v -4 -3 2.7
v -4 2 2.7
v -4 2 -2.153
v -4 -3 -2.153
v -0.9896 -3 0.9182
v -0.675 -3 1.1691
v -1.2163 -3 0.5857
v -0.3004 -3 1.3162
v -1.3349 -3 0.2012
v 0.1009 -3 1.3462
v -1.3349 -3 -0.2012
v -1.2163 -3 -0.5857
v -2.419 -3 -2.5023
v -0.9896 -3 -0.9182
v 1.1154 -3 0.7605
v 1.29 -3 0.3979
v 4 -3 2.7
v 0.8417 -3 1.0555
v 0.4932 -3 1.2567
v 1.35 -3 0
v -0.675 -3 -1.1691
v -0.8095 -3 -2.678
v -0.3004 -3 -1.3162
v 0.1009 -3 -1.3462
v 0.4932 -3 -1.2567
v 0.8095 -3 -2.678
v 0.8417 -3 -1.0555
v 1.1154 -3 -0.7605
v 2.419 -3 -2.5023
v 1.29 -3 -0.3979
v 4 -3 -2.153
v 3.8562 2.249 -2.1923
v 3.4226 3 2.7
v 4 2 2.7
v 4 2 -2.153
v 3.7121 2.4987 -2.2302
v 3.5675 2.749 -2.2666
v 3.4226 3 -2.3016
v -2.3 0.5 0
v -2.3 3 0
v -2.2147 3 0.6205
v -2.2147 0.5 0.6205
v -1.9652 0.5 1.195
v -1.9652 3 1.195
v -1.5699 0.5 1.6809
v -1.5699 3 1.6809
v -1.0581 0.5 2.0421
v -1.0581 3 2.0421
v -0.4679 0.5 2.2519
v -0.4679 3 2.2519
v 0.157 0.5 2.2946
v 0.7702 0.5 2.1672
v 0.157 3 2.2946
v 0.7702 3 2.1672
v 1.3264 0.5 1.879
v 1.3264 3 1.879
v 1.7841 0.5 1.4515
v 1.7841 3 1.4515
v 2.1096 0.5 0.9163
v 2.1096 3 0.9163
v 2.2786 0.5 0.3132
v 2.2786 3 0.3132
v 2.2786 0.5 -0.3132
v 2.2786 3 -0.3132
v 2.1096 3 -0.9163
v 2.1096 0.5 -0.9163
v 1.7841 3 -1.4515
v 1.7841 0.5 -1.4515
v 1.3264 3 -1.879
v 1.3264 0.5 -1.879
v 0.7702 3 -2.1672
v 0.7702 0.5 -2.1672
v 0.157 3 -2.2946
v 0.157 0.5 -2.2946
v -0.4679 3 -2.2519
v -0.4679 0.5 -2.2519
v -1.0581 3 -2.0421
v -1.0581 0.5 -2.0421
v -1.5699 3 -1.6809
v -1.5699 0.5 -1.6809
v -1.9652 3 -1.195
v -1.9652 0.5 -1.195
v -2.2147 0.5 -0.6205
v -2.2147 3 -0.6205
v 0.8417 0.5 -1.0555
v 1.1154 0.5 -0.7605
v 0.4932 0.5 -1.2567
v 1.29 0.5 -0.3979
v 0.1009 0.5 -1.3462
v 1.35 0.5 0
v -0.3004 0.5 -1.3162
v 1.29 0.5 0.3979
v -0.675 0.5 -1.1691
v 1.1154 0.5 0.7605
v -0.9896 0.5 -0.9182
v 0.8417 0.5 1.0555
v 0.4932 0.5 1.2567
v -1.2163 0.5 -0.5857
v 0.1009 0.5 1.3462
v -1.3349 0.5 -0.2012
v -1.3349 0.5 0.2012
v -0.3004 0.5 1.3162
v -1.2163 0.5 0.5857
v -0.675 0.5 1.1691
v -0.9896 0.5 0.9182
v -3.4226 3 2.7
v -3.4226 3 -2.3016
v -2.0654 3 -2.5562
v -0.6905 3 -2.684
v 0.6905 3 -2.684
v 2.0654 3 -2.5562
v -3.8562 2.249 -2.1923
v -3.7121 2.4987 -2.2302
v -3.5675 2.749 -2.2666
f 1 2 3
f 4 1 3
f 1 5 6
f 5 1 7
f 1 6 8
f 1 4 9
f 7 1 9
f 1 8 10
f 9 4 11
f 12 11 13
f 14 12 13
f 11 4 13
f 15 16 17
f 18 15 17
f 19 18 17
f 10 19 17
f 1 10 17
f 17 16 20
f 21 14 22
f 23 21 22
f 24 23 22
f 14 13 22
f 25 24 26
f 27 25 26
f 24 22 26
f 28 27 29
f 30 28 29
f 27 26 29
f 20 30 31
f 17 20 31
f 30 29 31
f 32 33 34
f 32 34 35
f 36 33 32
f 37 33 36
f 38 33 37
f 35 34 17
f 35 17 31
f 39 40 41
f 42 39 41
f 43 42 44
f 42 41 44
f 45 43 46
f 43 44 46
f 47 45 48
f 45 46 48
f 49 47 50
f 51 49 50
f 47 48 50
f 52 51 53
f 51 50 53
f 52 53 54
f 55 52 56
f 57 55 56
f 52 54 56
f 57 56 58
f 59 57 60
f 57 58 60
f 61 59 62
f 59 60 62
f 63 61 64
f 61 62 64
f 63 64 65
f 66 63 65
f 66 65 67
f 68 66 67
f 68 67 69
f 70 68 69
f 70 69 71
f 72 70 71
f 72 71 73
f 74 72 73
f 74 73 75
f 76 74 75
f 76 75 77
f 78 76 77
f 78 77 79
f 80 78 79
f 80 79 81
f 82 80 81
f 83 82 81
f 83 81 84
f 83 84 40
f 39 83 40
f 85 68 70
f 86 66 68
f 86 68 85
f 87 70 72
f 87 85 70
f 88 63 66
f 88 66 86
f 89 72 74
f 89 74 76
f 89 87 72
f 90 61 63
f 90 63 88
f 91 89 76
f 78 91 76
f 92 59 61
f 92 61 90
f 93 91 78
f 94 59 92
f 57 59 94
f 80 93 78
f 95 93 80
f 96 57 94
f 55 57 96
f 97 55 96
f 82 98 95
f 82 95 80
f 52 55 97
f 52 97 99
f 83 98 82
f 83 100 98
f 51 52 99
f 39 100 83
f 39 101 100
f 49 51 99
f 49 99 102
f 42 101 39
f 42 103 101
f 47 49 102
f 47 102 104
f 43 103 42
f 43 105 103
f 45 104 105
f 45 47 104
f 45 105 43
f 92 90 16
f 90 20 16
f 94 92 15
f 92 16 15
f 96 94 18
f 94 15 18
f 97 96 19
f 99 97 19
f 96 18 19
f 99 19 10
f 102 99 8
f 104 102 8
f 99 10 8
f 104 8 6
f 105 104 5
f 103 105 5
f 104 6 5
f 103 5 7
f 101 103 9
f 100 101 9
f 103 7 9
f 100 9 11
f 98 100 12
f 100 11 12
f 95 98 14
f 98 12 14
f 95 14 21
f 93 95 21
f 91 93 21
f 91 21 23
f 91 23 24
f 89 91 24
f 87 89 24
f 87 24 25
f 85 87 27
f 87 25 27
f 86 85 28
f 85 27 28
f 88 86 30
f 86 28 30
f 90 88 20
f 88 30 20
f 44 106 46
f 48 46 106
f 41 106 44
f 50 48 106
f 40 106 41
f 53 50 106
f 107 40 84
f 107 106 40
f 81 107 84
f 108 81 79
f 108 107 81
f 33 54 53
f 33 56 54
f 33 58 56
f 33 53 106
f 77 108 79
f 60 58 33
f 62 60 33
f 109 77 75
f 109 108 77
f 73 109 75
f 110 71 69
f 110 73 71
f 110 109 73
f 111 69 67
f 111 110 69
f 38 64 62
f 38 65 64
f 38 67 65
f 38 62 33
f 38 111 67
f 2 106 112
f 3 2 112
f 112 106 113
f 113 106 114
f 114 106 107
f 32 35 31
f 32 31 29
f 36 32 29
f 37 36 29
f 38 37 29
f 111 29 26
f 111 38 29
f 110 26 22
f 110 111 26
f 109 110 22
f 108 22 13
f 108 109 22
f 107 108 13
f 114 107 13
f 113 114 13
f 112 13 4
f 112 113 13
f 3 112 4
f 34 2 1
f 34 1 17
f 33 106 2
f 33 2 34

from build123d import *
from OCP.BRepFilletAPI import BRepFilletAPI_MakeChamfer

# Parameters (mm, degrees)
SKETCH1_W                = 8
SKETCH1_H                = 5.7
EXTRUDED_BOSS_BASE_DEPTH = 3
LEGACY_HOLE_D            = 2.7
LEGACY_HOLE_CBORE_D      = 4.6
LEGACY_HOLE_CBORE_DEPTH  = 2.5
FILLET_2_SIZE            = 1
FILLET_2_SIZE2           = 0.577350269
SKETCH4_R                = 15.717506164
SKETCH4_R_2              = 14.9
EXTRUDED_CUT_DEPTH       = 8.810249676


with BuildPart() as part:
    # Sketch1 → Extruded Boss/Base (new, symmetric)
    with BuildSketch(Plane(origin=(0, 0, 0), x_dir=(1, 0, 0), z_dir=(0, 1, 0))):
        with Locations((0, 0.15)):
            Rectangle(SKETCH1_W, SKETCH1_H)
    extrude(amount=EXTRUDED_BOSS_BASE_DEPTH, both=True)

    # Legacy Hole (through all)
    with Locations(Plane(origin=(0, 3, 0), x_dir=(-1, 0, 0), z_dir=(0, 1, 0))):
        with Locations((0, 0)):
            CounterBoreHole(LEGACY_HOLE_D / 2, LEGACY_HOLE_CBORE_D / 2, LEGACY_HOLE_CBORE_DEPTH)

    # Fillet 2: one chamfer whose edges measure the first distance from different faces: ONE call of the kernel's chamfer builder (chamfer() names one face for all edges)
    fillet_2_edges_1 = [part.edges().sort_by_distance(p)[0] for p in [
        (4, 3, -0.15),
    ]]
    fillet_2_side_1 = [part.faces().sort_by_distance(p)[0] for p in [
        (4, 0, -0.15),
    ]]
    fillet_2_edges_2 = [part.edges().sort_by_distance(p)[0] for p in [
        (-4, 3, -0.15),
    ]]
    fillet_2_side_2 = [part.faces().sort_by_distance(p)[0] for p in [
        (-4, 0, -0.15),
    ]]
    fillet_2 = BRepFilletAPI_MakeChamfer(part.part.solid().wrapped)
    for e in fillet_2_edges_1:
        fillet_2.Add(FILLET_2_SIZE, FILLET_2_SIZE2, e.wrapped, fillet_2_side_1[0].wrapped)  # the first distance lies on this face
    for e in fillet_2_edges_2:
        fillet_2.Add(FILLET_2_SIZE, FILLET_2_SIZE2, e.wrapped, fillet_2_side_2[0].wrapped)  # the first distance lies on this face
    add(Compound.cast(fillet_2.Shape()), mode=Mode.REPLACE)

    # Sketch4 → Extruded Cut (cut, through all)
    with BuildSketch(Plane(origin=(0, 3, 0), x_dir=(1, 0, 0), z_dir=(0, 1, 0))):
        with Locations((0, -12.2)):
            Circle(SKETCH4_R)
        with Locations((0, -12.2)):
            Circle(SKETCH4_R_2, mode=Mode.SUBTRACT)
    extrude(amount=-EXTRUDED_CUT_DEPTH, mode=Mode.SUBTRACT)


solid = part.part
